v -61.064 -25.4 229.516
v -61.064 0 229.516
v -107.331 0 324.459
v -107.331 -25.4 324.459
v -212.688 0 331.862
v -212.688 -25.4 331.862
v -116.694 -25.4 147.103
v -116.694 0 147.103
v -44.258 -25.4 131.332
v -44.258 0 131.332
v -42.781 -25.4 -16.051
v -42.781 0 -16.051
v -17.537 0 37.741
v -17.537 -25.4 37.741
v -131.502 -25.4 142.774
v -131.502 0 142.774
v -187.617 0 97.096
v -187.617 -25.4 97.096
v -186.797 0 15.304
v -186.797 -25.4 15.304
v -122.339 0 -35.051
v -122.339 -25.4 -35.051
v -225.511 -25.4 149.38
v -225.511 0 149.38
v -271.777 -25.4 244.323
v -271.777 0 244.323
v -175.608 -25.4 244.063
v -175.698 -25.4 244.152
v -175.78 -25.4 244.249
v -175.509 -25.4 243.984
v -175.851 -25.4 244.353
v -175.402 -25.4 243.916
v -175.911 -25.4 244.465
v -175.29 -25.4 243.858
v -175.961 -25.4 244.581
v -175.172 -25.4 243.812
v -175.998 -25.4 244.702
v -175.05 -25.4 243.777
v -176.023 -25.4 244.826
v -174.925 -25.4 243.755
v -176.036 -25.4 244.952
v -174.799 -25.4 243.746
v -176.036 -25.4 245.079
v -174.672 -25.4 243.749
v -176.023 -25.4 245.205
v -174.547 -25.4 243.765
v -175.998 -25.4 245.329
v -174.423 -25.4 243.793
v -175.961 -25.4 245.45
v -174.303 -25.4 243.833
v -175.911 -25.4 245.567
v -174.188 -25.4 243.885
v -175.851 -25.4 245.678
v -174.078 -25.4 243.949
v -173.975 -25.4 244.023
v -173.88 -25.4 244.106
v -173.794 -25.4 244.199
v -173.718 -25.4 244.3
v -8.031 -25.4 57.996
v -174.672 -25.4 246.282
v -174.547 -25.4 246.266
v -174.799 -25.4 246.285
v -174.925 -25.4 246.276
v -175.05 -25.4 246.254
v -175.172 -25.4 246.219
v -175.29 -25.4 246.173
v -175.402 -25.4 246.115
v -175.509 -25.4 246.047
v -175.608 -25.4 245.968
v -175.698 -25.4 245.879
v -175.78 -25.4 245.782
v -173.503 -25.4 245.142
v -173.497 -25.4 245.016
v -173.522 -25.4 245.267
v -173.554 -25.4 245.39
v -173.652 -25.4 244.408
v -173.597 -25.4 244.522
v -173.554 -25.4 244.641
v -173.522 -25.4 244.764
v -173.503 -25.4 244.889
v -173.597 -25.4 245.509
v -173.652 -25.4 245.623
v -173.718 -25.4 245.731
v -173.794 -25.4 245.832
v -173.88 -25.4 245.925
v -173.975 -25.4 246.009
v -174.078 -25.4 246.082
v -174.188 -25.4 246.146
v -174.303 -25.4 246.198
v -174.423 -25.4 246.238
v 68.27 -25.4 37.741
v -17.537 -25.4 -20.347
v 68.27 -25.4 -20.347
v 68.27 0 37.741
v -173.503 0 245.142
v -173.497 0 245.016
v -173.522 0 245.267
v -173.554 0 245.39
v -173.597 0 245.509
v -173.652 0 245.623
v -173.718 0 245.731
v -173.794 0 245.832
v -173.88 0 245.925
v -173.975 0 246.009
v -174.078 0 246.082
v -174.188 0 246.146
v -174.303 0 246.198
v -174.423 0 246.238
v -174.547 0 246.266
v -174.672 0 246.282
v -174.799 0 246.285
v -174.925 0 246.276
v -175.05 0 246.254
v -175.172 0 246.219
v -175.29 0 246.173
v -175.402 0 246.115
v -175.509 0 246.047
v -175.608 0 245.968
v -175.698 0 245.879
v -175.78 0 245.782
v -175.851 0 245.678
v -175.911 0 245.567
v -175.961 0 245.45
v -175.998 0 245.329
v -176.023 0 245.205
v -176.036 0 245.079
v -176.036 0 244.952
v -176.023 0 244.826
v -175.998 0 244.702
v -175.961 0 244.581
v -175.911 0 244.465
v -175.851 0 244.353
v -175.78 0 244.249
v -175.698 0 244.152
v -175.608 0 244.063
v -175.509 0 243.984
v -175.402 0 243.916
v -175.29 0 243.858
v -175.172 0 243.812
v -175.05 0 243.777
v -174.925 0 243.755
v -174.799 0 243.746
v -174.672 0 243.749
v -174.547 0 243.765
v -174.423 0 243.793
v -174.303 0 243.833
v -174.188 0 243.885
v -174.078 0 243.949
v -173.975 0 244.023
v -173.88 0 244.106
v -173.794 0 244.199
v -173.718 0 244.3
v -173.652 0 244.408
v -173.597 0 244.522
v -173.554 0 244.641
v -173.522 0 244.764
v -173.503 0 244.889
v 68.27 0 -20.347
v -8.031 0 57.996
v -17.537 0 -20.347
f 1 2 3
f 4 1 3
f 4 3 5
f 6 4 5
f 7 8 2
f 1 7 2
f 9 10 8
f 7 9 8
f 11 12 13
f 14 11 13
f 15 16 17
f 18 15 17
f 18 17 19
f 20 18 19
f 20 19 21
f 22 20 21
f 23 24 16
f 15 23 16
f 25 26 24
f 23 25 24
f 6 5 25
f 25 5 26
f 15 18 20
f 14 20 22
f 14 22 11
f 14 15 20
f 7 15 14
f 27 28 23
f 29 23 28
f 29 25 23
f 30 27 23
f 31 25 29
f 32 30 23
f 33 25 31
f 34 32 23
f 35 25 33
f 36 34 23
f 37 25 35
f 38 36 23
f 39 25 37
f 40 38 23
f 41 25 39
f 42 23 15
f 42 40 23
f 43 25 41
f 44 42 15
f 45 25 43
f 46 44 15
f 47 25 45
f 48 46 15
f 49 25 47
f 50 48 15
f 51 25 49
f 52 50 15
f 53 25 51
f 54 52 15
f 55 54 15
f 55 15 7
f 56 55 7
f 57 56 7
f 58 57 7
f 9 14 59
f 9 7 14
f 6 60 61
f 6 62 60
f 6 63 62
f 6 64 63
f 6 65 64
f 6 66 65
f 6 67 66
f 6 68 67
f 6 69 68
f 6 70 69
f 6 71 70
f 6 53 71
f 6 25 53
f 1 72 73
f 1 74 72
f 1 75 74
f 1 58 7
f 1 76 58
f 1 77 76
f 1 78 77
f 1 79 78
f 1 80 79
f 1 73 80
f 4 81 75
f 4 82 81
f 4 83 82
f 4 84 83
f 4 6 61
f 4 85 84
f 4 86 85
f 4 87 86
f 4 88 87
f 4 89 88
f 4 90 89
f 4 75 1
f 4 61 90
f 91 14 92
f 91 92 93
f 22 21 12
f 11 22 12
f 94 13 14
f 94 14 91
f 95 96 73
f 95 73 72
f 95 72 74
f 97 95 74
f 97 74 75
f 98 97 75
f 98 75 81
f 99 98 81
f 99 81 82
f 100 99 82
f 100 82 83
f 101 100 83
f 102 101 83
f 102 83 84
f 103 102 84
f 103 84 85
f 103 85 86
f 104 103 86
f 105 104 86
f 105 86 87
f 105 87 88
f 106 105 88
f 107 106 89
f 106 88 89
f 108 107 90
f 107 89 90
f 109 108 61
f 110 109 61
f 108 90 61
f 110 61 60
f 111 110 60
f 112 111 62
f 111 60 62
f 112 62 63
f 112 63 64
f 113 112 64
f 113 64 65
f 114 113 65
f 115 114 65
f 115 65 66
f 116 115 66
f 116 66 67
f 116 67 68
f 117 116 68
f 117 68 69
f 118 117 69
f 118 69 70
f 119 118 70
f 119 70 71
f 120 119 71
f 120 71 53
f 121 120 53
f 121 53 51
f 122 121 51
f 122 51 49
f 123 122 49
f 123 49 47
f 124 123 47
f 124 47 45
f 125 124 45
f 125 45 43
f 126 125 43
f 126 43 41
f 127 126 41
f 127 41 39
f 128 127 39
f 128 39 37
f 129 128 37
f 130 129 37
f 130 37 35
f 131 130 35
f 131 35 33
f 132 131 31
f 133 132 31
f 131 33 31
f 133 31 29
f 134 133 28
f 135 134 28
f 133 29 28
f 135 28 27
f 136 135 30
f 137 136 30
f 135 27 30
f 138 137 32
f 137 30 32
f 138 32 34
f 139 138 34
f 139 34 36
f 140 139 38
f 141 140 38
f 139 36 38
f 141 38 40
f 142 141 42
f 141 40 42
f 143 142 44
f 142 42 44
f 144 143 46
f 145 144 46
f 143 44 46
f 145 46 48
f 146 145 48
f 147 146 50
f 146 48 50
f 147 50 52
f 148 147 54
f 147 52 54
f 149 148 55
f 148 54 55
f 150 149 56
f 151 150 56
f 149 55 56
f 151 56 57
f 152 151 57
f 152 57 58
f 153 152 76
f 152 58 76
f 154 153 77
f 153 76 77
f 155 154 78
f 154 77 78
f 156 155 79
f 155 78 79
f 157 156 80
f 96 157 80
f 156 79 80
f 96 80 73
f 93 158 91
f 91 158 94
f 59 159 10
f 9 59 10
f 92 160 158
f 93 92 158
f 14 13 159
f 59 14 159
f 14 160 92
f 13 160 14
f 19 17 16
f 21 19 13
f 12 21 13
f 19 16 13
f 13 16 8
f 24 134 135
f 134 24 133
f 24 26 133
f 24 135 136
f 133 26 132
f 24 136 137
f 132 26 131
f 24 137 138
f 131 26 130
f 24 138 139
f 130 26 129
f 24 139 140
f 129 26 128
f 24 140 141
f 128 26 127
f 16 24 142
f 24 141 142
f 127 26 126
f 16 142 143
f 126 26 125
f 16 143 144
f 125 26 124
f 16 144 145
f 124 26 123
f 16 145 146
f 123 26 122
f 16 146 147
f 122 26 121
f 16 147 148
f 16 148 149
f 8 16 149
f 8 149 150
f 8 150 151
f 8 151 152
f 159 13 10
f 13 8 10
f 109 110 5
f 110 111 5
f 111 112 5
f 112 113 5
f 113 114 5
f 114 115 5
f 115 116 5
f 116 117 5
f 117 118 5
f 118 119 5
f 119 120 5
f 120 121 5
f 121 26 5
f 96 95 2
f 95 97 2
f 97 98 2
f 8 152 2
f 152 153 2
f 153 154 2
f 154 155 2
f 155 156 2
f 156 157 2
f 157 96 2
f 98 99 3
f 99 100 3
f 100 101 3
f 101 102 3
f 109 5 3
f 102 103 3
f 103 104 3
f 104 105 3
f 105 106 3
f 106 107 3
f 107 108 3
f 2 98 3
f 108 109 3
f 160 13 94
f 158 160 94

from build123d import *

# Parameters (mm, degrees)
F0_W     = 85.8063161263
F0_H     = 58.0885795211
F1_DEPTH = 25.4
F3_D     = 2.54


with BuildPart() as f1:
    # F0 (on Front) → F1 (new body)
    with BuildSketch(Plane.XZ):
        with Locations((25.3664523418, 8.6970223713)):
            Rectangle(F0_W, F0_H)
    extrude(amount=F1_DEPTH)


with BuildPart() as f1b:
    # F0 (on Front) → F1, piece 2 (new body)
    with BuildSketch(Plane.XZ):
        Polygon((-131.5015144818, 142.773748151), (-187.6168112916, 97.095707431), (-186.7969882742, 15.3044549322), (-122.3388607894, -35.050593437), (-42.7807135395, -16.0510591987), (-17.5367057214, 37.7413121318), (-8.0314540941, 57.9960208457), (-44.2579835713, 131.3316851377), (-116.6939098888, 147.1025812771), (-120.1541121892, 141.9763821052), align=None)
        Polygon((-225.5105666501, 149.3796324108), (-131.5015144818, 142.773748151), (-124.1809863883, 148.7326826904), (-116.6939098888, 147.1025812771), (-61.0644821235, 229.5161229683), (-107.3313065188, 324.4591141369), (-212.6877609798, 331.8623644425), (-271.7773910454, 244.3226235794), align=None)
        Polygon((-124.1809863883, 148.7326826904), (-131.5015144818, 142.773748151), (-120.1541121892, 141.9763821052), (-116.6939098888, 147.1025812771), align=None)
    extrude(amount=F1_DEPTH)

    # F3 (through all)
    with Locations(Plane(origin=(0, 0, 0), x_dir=(-1, 0, 0), z_dir=(0, 1, 0))):
        with Locations((174.7671812773, 245.0156211853)):
            Hole(F3_D / 2)


solid = Compound([f1.part, f1b.part])
